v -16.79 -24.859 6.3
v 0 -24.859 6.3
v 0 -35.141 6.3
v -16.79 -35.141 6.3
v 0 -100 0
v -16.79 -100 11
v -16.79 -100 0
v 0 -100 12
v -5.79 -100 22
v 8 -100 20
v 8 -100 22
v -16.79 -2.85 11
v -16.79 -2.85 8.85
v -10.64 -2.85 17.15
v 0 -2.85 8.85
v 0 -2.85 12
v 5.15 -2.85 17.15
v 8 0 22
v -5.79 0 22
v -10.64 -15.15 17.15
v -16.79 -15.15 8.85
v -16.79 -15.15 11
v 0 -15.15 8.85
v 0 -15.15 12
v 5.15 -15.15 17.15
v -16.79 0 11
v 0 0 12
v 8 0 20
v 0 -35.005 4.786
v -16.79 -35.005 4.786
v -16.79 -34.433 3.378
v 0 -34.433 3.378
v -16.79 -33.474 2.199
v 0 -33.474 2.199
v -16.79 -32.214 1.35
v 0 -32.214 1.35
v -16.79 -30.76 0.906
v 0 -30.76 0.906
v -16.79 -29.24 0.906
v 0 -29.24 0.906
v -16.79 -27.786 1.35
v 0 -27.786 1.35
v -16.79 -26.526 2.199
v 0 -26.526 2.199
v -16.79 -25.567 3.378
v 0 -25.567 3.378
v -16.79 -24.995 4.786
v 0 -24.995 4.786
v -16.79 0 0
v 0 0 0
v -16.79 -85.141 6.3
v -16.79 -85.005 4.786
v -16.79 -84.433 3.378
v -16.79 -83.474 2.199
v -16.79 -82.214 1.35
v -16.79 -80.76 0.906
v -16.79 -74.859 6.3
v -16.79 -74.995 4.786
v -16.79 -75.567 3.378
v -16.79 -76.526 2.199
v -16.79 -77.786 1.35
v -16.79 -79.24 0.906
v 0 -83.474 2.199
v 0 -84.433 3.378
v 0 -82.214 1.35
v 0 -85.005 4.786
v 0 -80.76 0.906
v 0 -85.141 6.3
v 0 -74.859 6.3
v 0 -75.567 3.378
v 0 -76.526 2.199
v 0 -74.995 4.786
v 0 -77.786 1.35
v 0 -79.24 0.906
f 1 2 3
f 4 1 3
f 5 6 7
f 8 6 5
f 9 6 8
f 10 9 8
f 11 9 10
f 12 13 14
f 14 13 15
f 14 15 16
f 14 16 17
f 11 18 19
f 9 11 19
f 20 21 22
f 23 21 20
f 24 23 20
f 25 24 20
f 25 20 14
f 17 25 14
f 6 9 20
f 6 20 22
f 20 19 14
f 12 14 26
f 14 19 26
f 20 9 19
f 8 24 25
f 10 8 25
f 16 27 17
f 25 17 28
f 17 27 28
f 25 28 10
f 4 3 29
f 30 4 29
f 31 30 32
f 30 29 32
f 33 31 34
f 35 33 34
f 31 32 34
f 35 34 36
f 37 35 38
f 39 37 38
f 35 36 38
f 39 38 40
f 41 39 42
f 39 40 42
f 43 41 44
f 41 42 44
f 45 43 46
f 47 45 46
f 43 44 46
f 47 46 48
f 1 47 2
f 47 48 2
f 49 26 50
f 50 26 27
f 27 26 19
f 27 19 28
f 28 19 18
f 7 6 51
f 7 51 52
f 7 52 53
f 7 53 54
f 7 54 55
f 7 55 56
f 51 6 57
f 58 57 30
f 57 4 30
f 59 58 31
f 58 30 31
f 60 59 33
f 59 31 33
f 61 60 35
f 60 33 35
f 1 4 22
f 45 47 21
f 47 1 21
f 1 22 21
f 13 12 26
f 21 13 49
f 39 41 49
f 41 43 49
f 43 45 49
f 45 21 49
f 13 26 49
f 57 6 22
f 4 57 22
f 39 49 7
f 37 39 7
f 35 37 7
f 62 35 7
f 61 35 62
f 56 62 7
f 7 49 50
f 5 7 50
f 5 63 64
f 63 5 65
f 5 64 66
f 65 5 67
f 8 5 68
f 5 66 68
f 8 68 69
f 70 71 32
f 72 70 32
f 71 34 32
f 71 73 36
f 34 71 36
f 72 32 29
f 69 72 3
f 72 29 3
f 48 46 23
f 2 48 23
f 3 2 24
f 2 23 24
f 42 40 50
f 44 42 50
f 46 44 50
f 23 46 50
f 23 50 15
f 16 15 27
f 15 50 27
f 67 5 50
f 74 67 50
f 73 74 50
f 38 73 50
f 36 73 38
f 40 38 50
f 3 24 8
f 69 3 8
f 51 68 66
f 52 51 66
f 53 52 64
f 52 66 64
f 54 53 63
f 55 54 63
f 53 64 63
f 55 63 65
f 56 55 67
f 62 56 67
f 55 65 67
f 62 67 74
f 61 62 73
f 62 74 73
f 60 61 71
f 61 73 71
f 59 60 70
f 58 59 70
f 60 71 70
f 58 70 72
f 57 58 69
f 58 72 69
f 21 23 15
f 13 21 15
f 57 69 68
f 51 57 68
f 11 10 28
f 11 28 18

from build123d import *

# Parameters (mm, degrees)
F1_DEPTH = 100
F3_DEPTH = 25
F4_W     = 12.3
F4_H     = 8.3
F5_DEPTH = 25


with BuildPart() as f1:
    # F0 (on Front) → F1 (new body)
    with BuildSketch(Plane.XZ):
        Polygon((-16.789507, 0), (0, 0), (0, 12), (8, 20), (8, 22), (-5.789507, 22), (-16.789507, 11), align=None)
    extrude(amount=F1_DEPTH)

    # F2 (on face) → F3 (cut)
    with BuildSketch(Plane.YZ):
        with BuildLine():
            Line((-74.858745, 6.3), (-85.141255, 6.3))
            ThreePointArc((-85.141255, 6.3), (-80, 0.85), (-74.858745, 6.3))
        make_face()
        with BuildLine():
            Line((-24.858745, 6.3), (-35.141255, 6.3))
            ThreePointArc((-35.141255, 6.3), (-30, 0.85), (-24.858745, 6.3))
        make_face()
    extrude(amount=-F3_DEPTH, mode=Mode.SUBTRACT)

    # F4 (on face) → F5 (cut)
    with BuildSketch(Plane.YZ.offset(8)):
        with Locations((-9, 13)):
            Rectangle(F4_W, F4_H)
    extrude(amount=-F5_DEPTH, mode=Mode.SUBTRACT)


solid = f1.part
